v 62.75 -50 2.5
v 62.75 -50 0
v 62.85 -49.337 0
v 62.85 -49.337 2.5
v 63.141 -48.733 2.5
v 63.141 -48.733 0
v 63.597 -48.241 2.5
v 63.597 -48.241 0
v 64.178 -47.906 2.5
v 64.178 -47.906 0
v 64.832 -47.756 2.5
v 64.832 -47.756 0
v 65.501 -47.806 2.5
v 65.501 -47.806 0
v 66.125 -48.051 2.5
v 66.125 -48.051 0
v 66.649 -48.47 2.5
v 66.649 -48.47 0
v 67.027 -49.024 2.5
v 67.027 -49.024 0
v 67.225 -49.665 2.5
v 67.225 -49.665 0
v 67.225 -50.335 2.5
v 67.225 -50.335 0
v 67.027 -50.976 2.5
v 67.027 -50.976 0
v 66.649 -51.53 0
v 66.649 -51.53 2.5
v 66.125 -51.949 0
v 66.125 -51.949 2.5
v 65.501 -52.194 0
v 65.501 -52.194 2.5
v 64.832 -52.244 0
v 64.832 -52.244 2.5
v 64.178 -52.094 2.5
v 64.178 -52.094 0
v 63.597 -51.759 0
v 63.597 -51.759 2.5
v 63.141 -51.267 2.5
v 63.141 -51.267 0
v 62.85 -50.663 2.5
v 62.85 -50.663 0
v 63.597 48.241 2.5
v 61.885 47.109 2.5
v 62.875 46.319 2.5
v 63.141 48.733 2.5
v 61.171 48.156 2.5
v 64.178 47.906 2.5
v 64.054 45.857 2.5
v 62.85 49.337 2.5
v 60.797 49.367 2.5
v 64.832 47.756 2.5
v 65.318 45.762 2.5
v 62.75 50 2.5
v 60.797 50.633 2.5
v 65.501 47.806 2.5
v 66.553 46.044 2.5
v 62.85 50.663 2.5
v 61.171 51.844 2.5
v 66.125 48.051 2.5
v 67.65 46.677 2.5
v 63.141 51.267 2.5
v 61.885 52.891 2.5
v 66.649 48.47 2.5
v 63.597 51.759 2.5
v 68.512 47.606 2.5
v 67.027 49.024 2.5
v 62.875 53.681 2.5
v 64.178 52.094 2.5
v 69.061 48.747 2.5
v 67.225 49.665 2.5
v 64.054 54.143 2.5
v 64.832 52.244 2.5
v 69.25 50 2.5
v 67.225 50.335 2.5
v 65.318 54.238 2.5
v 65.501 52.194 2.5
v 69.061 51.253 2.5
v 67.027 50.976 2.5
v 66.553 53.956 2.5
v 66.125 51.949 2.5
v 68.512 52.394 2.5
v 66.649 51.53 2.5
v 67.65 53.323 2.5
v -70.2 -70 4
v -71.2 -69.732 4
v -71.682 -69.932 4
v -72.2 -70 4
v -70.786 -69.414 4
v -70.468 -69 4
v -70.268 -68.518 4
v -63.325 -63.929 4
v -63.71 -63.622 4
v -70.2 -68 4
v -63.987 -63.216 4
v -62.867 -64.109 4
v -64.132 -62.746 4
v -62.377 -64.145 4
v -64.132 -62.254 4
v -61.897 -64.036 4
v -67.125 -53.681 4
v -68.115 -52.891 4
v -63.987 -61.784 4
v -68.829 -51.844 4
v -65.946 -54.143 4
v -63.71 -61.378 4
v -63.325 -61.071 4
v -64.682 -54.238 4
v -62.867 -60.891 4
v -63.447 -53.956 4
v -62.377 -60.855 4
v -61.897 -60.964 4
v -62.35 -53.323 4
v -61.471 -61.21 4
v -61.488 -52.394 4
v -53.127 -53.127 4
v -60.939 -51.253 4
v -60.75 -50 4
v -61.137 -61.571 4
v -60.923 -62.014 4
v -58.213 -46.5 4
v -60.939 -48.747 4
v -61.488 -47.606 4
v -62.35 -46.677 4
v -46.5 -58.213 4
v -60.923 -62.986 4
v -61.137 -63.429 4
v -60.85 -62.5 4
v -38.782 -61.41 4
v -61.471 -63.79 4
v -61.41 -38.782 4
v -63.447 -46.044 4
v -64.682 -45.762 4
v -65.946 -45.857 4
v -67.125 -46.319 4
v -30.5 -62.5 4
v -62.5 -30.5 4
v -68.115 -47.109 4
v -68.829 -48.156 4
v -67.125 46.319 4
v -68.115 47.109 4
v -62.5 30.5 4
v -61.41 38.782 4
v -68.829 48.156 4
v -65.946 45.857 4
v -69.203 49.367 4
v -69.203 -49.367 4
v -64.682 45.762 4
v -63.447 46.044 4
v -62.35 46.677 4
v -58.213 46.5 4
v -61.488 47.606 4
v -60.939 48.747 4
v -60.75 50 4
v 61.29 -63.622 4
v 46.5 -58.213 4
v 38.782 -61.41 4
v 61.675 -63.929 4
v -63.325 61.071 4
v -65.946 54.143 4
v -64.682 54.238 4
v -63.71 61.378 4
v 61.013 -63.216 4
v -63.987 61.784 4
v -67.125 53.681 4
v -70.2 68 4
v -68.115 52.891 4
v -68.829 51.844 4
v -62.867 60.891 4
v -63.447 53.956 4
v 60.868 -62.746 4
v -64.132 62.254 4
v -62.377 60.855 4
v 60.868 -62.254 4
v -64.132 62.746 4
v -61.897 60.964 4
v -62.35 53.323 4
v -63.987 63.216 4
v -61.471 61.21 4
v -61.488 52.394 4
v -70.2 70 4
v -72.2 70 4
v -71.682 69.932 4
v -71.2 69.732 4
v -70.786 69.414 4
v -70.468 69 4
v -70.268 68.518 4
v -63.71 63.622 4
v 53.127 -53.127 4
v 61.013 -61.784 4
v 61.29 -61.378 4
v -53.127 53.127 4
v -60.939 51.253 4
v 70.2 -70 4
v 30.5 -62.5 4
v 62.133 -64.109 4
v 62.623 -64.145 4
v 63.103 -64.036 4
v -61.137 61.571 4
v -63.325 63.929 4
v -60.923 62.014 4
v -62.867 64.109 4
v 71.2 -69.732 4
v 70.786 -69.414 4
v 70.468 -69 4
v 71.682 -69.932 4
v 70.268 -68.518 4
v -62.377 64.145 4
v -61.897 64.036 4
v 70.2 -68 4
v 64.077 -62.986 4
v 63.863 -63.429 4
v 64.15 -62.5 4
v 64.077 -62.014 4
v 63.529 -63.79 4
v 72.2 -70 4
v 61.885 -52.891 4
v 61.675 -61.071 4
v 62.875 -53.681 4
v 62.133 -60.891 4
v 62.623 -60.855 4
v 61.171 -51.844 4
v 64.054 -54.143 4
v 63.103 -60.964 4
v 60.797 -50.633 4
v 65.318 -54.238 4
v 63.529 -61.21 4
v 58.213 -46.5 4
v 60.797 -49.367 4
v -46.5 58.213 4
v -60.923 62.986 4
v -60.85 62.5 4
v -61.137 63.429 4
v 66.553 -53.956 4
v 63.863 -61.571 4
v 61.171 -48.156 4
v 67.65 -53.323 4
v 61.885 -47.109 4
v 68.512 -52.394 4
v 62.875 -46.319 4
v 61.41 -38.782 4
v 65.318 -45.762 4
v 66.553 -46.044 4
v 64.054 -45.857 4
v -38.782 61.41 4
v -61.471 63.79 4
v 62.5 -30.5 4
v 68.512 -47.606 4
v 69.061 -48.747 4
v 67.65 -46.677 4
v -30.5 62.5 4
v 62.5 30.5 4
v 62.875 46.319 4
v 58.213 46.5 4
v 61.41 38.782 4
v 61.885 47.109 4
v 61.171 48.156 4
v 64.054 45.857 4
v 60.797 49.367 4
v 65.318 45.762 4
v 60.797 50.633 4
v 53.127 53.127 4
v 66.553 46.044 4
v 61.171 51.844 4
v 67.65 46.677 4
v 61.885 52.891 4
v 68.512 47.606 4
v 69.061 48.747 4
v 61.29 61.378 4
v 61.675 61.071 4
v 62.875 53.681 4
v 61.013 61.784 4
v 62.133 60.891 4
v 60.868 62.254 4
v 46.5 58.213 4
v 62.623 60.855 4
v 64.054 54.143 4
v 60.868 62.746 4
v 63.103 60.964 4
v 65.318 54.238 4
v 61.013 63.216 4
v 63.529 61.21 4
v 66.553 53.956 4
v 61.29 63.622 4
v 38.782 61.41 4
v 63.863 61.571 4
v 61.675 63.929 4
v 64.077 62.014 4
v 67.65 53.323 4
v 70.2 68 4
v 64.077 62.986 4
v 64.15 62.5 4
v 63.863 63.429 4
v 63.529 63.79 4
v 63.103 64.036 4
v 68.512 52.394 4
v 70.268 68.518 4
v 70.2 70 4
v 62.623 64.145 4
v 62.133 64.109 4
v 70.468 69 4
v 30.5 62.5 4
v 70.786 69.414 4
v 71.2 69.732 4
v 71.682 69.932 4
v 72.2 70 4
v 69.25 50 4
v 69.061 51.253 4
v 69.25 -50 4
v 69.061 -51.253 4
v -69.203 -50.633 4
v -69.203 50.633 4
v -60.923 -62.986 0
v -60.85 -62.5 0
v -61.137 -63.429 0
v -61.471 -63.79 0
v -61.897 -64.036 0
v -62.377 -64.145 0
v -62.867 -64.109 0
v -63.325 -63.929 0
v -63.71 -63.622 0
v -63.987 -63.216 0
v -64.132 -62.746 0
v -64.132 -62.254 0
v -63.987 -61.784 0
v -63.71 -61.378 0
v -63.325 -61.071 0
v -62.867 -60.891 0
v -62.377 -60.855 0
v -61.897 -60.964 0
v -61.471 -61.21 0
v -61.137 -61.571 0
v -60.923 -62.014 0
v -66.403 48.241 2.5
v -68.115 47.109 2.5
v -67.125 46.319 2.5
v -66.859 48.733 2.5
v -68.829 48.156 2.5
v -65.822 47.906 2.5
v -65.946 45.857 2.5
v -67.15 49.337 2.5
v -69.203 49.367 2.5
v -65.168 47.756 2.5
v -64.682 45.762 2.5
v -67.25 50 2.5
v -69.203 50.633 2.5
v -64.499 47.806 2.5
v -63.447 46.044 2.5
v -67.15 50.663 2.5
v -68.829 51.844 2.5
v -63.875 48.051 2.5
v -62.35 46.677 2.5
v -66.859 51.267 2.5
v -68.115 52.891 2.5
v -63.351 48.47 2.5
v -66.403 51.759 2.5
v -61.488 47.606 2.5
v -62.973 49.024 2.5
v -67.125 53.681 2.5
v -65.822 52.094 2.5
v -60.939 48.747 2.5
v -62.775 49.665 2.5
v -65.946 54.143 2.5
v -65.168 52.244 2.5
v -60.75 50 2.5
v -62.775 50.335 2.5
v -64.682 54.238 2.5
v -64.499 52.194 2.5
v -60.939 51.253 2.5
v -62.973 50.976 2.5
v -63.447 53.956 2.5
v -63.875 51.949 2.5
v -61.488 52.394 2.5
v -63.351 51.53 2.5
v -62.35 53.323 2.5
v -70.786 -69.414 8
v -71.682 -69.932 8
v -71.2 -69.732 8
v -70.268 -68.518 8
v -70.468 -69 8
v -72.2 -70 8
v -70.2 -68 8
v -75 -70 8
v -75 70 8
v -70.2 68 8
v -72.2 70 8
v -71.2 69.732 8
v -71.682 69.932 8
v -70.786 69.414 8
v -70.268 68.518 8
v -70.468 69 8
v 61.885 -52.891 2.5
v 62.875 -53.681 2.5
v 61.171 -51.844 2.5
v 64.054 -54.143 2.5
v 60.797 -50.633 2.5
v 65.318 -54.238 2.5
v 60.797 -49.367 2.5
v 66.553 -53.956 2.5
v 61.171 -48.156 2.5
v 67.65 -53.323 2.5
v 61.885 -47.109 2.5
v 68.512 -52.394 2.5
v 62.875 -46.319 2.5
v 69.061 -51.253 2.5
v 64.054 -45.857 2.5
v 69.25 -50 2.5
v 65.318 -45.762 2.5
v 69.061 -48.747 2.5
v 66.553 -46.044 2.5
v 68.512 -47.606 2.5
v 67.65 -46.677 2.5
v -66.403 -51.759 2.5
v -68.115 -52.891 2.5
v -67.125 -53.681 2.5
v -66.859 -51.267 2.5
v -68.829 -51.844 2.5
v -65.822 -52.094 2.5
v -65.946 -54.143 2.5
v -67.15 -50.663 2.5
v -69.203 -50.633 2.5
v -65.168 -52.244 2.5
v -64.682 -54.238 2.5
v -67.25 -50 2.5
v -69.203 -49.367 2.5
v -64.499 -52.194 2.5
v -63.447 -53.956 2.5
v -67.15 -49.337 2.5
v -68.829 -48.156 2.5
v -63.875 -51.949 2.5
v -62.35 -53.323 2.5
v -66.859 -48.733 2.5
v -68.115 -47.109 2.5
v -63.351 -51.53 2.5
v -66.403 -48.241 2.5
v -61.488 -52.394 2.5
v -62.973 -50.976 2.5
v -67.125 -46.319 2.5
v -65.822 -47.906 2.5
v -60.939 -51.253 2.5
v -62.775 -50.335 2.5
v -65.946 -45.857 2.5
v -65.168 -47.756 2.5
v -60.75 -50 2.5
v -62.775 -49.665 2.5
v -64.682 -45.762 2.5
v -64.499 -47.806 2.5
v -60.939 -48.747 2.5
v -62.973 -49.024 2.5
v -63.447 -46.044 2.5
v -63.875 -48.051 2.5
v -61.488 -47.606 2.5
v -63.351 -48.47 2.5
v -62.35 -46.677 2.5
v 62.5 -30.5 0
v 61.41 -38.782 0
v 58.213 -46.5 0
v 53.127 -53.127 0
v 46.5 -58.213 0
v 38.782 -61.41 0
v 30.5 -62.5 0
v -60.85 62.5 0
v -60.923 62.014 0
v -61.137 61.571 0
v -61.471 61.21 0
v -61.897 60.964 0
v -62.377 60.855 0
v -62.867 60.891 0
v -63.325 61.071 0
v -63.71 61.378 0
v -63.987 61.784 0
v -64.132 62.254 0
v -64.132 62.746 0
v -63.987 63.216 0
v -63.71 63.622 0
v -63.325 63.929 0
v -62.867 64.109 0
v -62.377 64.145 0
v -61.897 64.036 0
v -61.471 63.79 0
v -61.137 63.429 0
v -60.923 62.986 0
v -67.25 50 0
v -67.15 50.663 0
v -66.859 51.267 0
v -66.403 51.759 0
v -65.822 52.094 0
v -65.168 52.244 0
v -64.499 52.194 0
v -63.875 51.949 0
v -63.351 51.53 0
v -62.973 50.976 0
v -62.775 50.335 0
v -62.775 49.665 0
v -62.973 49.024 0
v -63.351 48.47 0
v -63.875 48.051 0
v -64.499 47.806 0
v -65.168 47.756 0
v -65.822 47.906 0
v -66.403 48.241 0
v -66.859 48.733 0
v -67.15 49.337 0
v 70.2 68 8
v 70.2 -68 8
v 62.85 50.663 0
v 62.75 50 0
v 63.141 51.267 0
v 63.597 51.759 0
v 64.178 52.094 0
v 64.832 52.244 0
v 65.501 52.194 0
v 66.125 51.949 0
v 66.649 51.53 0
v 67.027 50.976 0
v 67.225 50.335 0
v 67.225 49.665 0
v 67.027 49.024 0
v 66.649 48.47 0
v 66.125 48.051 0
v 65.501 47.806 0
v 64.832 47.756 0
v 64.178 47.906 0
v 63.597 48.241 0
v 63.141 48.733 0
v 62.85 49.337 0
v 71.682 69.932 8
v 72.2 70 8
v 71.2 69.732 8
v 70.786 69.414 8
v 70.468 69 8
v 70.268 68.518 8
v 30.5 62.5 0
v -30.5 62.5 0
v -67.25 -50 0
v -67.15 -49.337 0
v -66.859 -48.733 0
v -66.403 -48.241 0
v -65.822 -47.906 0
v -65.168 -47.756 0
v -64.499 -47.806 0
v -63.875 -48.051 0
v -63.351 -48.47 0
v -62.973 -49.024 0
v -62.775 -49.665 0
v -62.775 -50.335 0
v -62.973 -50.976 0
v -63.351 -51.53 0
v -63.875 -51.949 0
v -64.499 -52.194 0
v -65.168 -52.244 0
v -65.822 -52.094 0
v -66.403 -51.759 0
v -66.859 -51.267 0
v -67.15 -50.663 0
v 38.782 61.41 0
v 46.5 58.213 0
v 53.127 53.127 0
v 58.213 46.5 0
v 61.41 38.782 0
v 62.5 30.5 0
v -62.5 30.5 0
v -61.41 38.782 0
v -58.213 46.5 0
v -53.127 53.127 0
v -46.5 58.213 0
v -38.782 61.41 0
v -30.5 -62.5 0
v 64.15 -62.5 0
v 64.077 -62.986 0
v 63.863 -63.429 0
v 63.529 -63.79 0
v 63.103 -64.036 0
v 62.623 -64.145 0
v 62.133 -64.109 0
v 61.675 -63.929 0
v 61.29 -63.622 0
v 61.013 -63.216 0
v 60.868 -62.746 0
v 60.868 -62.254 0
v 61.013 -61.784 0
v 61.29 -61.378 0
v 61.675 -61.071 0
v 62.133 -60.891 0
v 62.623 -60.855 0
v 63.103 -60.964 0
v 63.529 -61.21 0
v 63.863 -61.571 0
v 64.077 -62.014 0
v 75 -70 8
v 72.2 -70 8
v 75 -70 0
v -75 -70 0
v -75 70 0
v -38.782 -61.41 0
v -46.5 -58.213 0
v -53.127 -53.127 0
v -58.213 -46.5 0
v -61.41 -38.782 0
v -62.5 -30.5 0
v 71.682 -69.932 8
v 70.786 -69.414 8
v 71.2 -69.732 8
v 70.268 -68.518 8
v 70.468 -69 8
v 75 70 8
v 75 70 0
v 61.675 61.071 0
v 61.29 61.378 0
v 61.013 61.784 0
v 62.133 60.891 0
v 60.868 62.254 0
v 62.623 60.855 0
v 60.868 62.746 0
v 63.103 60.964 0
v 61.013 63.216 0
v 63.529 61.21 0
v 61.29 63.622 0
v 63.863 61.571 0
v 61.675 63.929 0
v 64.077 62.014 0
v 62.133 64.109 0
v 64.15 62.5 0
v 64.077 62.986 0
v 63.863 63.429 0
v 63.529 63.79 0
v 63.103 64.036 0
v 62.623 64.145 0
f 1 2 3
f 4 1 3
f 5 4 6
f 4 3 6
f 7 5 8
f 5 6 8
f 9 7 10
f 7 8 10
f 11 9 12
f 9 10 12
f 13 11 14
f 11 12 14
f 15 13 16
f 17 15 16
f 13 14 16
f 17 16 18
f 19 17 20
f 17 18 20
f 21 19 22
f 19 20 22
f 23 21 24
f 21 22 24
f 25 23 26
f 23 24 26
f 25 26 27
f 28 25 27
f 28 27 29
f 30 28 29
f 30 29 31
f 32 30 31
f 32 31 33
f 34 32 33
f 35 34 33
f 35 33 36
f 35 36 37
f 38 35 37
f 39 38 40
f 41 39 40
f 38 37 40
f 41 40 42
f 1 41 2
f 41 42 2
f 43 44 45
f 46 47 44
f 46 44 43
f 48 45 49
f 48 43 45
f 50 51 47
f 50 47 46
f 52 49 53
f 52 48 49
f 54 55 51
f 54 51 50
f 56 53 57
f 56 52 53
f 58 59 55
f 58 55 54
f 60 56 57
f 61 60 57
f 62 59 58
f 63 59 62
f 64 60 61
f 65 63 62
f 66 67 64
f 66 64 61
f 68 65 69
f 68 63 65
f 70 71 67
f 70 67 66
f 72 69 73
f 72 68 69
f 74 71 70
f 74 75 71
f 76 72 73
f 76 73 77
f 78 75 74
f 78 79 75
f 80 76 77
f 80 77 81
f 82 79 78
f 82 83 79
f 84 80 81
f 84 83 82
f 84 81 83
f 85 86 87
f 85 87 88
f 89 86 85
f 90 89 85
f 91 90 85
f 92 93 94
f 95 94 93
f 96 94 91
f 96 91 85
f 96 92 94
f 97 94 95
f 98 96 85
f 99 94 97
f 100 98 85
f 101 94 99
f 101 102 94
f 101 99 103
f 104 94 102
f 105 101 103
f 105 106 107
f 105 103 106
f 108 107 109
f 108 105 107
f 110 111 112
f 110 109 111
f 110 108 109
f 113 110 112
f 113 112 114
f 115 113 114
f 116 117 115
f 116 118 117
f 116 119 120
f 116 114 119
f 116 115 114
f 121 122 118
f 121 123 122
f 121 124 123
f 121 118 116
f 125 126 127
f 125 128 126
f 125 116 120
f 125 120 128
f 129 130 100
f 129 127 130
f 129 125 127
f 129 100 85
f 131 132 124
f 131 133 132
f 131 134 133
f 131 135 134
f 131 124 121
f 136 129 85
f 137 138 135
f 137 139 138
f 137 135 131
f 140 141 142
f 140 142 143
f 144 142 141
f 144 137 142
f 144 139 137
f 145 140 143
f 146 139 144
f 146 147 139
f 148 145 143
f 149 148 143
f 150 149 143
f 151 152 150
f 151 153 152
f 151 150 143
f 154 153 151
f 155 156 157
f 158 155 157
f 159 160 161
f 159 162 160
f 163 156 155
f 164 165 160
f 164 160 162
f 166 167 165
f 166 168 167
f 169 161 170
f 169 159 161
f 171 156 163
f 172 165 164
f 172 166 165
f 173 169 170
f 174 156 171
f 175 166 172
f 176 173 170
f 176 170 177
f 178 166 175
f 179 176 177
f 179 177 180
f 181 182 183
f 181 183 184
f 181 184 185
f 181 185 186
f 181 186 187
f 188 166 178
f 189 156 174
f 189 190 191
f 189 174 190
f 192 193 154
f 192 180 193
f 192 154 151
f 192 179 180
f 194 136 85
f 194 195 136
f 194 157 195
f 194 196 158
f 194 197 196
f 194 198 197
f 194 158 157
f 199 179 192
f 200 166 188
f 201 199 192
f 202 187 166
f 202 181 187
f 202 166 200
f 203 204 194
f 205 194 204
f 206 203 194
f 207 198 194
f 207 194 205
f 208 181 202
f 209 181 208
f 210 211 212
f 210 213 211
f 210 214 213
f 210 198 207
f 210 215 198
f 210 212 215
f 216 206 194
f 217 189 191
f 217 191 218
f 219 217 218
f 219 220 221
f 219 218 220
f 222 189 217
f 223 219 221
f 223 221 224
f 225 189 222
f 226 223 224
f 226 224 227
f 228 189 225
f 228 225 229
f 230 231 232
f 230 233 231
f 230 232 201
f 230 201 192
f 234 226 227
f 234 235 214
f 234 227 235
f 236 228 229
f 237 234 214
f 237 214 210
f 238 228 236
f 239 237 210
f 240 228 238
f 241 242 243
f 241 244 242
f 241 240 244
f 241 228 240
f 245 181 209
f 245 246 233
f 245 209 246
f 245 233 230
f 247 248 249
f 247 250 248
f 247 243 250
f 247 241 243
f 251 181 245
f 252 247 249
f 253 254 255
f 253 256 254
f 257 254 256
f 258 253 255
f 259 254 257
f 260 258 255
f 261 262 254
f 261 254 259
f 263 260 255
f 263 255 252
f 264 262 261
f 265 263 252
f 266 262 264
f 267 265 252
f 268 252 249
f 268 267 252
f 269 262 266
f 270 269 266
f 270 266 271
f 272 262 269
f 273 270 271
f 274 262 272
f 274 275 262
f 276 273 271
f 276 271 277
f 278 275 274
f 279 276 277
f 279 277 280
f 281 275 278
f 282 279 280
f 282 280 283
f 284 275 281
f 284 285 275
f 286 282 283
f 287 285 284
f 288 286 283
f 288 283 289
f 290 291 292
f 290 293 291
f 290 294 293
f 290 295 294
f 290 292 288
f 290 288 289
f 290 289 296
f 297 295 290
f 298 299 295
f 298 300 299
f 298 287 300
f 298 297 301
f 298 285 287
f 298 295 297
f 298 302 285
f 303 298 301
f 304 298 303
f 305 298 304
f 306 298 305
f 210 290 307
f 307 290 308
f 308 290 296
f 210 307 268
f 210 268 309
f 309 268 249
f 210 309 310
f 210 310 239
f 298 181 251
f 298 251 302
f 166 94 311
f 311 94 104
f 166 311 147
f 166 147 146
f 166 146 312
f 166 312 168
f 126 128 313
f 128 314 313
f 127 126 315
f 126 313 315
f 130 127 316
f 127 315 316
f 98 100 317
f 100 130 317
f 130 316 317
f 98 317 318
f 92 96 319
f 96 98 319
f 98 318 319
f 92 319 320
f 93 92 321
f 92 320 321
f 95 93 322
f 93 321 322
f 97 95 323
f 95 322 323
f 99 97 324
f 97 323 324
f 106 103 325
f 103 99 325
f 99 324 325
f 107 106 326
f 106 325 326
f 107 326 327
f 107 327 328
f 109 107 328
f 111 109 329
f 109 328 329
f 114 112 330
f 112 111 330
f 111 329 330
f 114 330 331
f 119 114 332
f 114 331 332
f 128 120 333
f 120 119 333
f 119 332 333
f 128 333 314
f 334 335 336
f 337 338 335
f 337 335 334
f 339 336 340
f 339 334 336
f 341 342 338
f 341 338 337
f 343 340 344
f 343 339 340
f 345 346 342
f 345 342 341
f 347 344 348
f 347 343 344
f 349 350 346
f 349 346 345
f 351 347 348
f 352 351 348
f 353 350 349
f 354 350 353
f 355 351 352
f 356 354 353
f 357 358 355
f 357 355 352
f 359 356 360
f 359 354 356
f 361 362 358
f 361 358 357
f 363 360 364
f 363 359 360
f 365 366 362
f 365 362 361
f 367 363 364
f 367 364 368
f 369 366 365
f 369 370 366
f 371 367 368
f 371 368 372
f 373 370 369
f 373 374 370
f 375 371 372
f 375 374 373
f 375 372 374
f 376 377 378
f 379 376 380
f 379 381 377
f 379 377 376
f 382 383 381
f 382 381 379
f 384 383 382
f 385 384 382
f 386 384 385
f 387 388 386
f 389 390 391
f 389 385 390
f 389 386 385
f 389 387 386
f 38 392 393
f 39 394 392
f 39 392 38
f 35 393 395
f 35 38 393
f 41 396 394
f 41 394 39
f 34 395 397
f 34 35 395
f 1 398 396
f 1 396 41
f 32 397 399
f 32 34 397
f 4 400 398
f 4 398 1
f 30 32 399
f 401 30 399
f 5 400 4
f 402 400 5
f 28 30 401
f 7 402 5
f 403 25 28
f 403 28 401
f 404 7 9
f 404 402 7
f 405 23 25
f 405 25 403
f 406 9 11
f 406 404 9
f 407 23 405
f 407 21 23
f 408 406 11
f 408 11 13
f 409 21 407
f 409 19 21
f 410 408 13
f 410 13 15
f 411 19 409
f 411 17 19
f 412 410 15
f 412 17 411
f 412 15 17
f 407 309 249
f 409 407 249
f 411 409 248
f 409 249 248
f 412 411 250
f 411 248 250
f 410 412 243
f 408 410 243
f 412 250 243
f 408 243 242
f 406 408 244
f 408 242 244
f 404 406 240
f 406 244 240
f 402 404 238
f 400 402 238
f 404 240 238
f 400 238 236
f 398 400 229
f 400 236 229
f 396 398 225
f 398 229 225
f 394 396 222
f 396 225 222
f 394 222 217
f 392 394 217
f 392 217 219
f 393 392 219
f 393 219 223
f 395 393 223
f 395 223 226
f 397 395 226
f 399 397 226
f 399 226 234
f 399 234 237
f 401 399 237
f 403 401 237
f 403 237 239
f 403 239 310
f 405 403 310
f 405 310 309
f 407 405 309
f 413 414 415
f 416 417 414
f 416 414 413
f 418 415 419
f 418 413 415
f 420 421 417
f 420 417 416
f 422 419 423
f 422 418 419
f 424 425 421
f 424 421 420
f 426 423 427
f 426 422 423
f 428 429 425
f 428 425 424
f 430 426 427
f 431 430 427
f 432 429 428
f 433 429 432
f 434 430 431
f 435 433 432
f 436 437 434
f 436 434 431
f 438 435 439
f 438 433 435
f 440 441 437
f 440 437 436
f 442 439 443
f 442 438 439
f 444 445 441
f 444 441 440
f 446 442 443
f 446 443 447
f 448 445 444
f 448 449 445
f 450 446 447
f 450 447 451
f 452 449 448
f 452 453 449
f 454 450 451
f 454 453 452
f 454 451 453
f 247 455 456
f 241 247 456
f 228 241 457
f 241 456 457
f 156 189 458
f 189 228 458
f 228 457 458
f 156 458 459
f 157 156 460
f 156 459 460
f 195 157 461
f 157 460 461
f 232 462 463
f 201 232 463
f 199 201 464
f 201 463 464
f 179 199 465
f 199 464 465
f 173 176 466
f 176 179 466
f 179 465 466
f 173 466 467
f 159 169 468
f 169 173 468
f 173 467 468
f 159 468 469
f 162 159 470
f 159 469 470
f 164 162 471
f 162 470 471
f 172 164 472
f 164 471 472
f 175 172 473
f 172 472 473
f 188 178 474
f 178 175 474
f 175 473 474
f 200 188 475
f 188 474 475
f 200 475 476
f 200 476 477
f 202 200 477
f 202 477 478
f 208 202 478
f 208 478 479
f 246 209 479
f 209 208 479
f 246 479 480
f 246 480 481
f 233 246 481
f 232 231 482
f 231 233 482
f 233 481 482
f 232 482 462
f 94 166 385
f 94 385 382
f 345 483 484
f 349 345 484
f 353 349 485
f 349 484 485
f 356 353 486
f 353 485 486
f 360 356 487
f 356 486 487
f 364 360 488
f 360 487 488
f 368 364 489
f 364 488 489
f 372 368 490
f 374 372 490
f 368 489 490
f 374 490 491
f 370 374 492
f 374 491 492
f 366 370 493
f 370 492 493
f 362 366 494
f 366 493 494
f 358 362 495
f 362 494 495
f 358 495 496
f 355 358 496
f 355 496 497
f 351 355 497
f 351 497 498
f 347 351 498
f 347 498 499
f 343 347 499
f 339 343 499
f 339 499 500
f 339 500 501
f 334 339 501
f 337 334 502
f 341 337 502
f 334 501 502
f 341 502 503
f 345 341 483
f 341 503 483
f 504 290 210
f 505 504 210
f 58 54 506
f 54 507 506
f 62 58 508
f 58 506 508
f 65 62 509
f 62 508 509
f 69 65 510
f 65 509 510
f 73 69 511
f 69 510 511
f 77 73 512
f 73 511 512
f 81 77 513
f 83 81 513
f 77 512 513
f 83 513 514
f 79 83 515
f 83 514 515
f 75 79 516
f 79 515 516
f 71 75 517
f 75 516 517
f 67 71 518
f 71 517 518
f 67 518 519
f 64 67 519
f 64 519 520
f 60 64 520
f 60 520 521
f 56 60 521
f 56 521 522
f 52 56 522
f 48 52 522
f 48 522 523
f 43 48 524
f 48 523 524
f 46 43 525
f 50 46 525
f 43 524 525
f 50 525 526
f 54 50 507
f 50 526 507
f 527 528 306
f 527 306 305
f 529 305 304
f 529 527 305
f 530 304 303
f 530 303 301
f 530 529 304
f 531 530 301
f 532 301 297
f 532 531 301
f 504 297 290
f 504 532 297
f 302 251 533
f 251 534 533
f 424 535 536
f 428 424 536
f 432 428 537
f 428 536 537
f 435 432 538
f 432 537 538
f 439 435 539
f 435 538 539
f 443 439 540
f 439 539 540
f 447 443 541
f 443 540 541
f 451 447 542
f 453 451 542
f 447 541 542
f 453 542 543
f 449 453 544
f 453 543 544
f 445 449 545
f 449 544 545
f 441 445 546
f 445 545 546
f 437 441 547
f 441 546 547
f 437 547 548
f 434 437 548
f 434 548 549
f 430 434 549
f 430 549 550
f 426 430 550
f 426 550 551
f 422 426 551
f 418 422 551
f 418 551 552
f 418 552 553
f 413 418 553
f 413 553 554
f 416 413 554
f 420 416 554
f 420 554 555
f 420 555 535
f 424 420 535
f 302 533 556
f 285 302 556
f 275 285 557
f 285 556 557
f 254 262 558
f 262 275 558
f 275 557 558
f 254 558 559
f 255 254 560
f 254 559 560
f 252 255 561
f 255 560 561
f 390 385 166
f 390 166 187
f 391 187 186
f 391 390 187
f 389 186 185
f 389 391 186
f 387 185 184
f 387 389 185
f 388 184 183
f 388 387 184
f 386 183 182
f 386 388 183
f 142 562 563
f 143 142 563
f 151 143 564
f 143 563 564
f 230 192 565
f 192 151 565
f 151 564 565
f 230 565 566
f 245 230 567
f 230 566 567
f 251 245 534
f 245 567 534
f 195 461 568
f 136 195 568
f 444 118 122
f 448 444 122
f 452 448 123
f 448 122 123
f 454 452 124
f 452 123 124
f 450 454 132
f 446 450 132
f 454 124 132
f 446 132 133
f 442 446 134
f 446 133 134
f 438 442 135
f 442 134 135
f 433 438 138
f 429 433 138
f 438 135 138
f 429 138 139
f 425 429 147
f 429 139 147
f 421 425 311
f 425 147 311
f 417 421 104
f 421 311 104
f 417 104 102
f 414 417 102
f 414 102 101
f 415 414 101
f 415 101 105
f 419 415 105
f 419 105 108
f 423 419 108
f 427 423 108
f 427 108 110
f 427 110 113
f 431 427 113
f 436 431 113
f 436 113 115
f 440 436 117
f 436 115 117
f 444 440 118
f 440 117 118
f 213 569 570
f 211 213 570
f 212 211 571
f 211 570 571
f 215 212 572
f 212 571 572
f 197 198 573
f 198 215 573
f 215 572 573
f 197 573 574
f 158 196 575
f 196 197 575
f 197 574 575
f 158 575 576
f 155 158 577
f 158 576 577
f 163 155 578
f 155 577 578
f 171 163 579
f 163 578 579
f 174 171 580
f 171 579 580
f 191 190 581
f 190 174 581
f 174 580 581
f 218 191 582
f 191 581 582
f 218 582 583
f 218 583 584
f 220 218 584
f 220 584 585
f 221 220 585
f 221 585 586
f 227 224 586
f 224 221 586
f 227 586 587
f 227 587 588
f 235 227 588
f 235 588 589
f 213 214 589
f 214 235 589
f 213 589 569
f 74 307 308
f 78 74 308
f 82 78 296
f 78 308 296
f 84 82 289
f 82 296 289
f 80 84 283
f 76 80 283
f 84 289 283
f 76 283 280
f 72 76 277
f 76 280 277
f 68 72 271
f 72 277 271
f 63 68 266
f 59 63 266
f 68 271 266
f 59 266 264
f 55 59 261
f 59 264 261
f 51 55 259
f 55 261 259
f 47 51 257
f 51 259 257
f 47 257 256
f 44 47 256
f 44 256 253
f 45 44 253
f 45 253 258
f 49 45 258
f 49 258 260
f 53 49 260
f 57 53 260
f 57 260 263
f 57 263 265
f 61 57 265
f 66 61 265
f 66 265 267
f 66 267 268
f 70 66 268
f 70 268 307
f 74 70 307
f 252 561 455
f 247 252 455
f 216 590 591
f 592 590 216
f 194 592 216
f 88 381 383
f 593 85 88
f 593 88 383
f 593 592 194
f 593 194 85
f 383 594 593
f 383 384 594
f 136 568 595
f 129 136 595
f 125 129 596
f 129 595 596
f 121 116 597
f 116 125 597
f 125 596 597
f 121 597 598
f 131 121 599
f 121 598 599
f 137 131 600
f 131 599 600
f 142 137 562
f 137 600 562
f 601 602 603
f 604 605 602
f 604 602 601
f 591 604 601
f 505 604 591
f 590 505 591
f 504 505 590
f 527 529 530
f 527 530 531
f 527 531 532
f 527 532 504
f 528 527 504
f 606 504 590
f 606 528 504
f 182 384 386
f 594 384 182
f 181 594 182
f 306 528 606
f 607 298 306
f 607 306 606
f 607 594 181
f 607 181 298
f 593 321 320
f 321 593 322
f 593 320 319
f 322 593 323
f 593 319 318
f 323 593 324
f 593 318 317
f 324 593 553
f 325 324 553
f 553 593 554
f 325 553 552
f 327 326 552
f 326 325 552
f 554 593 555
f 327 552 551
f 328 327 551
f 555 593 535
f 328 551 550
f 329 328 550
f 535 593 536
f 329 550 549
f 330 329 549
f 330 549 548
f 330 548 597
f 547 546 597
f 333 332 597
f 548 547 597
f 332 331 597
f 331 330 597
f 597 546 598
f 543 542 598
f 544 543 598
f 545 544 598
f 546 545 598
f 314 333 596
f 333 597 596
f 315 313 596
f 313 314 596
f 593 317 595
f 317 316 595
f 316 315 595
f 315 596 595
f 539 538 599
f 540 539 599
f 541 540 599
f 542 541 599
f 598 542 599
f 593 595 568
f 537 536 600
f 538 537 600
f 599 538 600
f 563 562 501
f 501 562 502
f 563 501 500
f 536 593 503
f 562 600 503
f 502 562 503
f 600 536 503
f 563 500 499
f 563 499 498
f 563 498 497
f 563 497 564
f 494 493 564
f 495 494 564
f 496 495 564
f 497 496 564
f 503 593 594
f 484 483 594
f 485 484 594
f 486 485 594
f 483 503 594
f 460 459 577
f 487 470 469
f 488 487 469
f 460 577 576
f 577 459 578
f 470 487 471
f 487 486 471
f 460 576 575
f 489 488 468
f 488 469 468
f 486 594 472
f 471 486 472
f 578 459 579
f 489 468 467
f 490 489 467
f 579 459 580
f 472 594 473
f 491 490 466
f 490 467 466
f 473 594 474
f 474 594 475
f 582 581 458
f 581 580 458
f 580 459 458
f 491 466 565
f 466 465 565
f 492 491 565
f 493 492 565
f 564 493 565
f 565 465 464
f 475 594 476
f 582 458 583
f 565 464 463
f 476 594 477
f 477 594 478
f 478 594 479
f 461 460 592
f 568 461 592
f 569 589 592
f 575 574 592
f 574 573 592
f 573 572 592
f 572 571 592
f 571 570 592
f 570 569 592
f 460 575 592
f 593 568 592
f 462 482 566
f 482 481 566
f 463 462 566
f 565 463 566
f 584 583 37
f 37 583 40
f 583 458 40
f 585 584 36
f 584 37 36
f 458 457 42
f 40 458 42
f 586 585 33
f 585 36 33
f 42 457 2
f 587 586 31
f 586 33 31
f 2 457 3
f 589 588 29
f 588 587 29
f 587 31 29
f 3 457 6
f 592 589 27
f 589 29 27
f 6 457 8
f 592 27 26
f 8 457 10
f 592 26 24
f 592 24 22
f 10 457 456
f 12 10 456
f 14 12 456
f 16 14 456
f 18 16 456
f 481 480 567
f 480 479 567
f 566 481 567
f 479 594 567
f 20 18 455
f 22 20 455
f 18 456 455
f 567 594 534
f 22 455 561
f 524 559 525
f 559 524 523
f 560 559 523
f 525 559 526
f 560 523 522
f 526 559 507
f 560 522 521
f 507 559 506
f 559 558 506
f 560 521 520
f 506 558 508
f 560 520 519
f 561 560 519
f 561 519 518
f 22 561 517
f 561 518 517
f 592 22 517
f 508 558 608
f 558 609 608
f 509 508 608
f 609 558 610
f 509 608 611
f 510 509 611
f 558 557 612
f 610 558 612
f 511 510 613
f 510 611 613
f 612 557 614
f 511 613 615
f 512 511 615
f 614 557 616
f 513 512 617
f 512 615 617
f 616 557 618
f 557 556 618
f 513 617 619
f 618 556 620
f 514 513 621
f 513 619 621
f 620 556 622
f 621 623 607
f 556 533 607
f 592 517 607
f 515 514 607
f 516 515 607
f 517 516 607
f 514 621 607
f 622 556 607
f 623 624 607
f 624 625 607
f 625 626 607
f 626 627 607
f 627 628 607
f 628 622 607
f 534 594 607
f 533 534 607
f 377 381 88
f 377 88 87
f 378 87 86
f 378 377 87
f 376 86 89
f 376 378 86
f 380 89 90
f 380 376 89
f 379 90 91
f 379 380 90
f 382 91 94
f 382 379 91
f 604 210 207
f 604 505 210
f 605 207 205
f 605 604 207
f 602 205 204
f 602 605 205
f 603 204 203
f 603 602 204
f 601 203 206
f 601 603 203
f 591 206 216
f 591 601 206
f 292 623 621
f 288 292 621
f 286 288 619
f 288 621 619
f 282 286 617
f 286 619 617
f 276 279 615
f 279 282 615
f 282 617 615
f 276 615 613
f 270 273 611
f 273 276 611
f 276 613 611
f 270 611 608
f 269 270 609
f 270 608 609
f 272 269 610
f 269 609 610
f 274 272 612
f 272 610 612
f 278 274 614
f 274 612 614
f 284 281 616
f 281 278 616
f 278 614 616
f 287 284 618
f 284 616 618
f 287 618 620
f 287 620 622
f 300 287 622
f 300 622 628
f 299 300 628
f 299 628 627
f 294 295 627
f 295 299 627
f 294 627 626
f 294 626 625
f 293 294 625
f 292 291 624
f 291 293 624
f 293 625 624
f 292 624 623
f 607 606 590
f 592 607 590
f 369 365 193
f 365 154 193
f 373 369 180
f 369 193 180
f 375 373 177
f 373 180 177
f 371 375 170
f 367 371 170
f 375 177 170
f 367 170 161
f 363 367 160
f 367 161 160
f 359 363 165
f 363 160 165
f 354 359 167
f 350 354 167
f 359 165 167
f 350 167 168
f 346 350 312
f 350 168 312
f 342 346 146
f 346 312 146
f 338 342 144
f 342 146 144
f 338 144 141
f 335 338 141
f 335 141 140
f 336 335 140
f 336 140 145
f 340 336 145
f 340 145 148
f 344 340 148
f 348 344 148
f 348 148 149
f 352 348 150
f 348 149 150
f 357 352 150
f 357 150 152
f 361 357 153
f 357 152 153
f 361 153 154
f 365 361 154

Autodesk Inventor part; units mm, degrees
ref_plane "YZ Plane" through (0, 0, 0) normal (1, 0, 0) x (0, 1, 0)
ref_plane "XZ Plane" through (0, 0, 0) normal (0, 1, 0) x (-1, 0, 0)
ref_plane "XY Plane" through (0, 0, 0) normal (0, 0, 1) x (1, 0, 0)
sketch "スケッチ1" plane through (0, 0, 0) normal (0, 0, 1) x (1, 0, 0)
  line L0 (-70, 70) -> (70, 70)
  line L1 (70, 70) -> (70, -70)
  line L2 (70, -70) -> (-70, -70)
  line L3 (-70, -70) -> (-70, 70)
  line L4 (-62.5, 62.5) -> (62.5, 62.5) construction
  line L5 (62.5, 62.5) -> (62.5, -62.5) construction
  line L6 (62.5, -62.5) -> (-62.5, -62.5) construction
  line L7 (-62.5, -62.5) -> (-62.5, 62.5) construction
  circle A0 centre (-62.5, 62.5) radius 1.65
  line L8 (-30.5, 62.5) -> (30.5, 62.5)
  line L9 (62.5, 30.5) -> (62.5, -30.5)
  line L10 (30.5, -62.5) -> (-30.5, -62.5)
  line L11 (-62.5, -30.5) -> (-62.5, 30.5)
  arc A1 (-30.5, 62.5) -> (-62.5, 30.5) centre (-30.5, 30.5) ccw
  arc A2 (-62.5, -30.5) -> (-30.5, -62.5) centre (-30.5, -30.5) ccw
  arc A3 (30.5, -62.5) -> (62.5, -30.5) centre (30.5, -30.5) ccw
  arc A4 (62.5, 30.5) -> (30.5, 62.5) centre (30.5, 30.5) ccw
  line L12 (53.1274, 53.1274) -> (-53.1274, -53.1274) construction
  circle A5 centre (-62.5, -62.5) radius 1.65
  circle A6 centre (62.5, -62.5) radius 1.65
  circle A7 centre (62.5, 62.5) radius 1.65
  point P0 (0, 0)
  point P1 (-70, 0)
  point P2 (0, 70)
  point P3 (-62.5, 0)
  point P4 (0, 62.5)
  dimension "d0" = 140
  dimension "d1" = 125
  dimension "d3" = 3.3
  dimension "d4" = 32
  dimension "d5" = 150.267
extrude "押し出し1" add sketch "スケッチ1" along normal blind 4
sketch "スケッチ2" plane through (0, 0, 4) normal (0, 0, 1) x (1, 0, 0)
  line L0 (-70, 70) -> (-70, -70) construction
  line L1 (70, -70) -> (70, 70) construction
  line L2 (-70, 70) -> (-75, 70)
  line L3 (-75, 70) -> (-75, -70)
  line L4 (-75, -70) -> (-70, -70)
  line L5 (-70, -70) -> (-70, 70)
  line L6 (70, 70) -> (75, 70)
  line L7 (75, 70) -> (75, -70)
  line L8 (75, -70) -> (70, -70)
  line L9 (70, -70) -> (70, 70)
  point P0 (0, 0)
  dimension "d8" = 150
extrude "押し出し2" add sketch "スケッチ2" against normal up to surface (4 mm away)
sketch "スケッチ3" plane through (0, 0, 4) normal (0, 0, 1) x (1, 0, 0)
  line L0 (-75, 70) -> (-75, -70) construction
  line L1 (75, 70) -> (75, -70) construction
  line L2 (-75, 70) -> (-70.2, 70)
  line L3 (-70.2, 70) -> (-70.2, -70)
  line L4 (-70.2, -70) -> (-75, -70)
  line L5 (-75, -70) -> (-75, 70)
  line L6 (75, 70) -> (70.2, 70)
  line L7 (70.2, 70) -> (70.2, -70)
  line L8 (70.2, -70) -> (75, -70)
  line L9 (75, -70) -> (75, 70)
  point P0 (0, 0)
  dimension "d11" = 140.4
extrude "押し出し3" add sketch "スケッチ3" along normal blind 4
sketch "スケッチ5" plane through (0, 0, 0) normal (0, 0, -1) x (-1, 0, 0)
  line L0 (75, -70) -> (75, 70) construction
  line L1 (-75, 70) -> (-75, -70) construction
  line L2 (65, -70) -> (65, 70) construction
  line L3 (-65, 70) -> (-65, -70) construction
  circle A0 centre (65, -50) radius 2.25
  circle A1 centre (-65, -50) radius 2.25
  circle A2 centre (65, 50) radius 2.25
  circle A3 centre (-65, 50) radius 2.25
  circle A4 centre (65, -50) radius 7.5 construction
  point P0 (0, 0)
  dimension "d14" = 10
  dimension "d15" = 10
  dimension "d16" = 4.5
  dimension "d17" = 50
  dimension "d18" = 50
  dimension "d19" = 15
extrude "押し出し4" cut sketch "スケッチ5" against normal through all
sketch "スケッチ6" plane through (0, 0, 4) normal (0, 0, 1) x (1, 0, 0)
  circle A0 centre (-65, -50) radius 2.25 construction
  circle A1 centre (65, -50) radius 2.25 construction
  circle A2 centre (65, 50) radius 2.25 construction
  circle A3 centre (-65, 50) radius 2.25 construction
  circle A4 centre (-65, -50) radius 4.25
  circle A5 centre (-65, 50) radius 4.25
  circle A6 centre (65, -50) radius 4.25
  circle A7 centre (65, 50) radius 4.25
  point P0 (0, 0)
  dimension "d22" = 8.5
extrude "押し出し5" cut sketch "スケッチ6" against normal blind 1.5
fillet "フィレット1" radius 2 4 edges at (70.2, 70, 6) (70.2, -70, 6) (-70.2, -70, 6) (-70.2, 70, 6)
equation "\"d18\" = d17"
properties part number "bottom_140mm_2" material "アルミニウム 6061"
